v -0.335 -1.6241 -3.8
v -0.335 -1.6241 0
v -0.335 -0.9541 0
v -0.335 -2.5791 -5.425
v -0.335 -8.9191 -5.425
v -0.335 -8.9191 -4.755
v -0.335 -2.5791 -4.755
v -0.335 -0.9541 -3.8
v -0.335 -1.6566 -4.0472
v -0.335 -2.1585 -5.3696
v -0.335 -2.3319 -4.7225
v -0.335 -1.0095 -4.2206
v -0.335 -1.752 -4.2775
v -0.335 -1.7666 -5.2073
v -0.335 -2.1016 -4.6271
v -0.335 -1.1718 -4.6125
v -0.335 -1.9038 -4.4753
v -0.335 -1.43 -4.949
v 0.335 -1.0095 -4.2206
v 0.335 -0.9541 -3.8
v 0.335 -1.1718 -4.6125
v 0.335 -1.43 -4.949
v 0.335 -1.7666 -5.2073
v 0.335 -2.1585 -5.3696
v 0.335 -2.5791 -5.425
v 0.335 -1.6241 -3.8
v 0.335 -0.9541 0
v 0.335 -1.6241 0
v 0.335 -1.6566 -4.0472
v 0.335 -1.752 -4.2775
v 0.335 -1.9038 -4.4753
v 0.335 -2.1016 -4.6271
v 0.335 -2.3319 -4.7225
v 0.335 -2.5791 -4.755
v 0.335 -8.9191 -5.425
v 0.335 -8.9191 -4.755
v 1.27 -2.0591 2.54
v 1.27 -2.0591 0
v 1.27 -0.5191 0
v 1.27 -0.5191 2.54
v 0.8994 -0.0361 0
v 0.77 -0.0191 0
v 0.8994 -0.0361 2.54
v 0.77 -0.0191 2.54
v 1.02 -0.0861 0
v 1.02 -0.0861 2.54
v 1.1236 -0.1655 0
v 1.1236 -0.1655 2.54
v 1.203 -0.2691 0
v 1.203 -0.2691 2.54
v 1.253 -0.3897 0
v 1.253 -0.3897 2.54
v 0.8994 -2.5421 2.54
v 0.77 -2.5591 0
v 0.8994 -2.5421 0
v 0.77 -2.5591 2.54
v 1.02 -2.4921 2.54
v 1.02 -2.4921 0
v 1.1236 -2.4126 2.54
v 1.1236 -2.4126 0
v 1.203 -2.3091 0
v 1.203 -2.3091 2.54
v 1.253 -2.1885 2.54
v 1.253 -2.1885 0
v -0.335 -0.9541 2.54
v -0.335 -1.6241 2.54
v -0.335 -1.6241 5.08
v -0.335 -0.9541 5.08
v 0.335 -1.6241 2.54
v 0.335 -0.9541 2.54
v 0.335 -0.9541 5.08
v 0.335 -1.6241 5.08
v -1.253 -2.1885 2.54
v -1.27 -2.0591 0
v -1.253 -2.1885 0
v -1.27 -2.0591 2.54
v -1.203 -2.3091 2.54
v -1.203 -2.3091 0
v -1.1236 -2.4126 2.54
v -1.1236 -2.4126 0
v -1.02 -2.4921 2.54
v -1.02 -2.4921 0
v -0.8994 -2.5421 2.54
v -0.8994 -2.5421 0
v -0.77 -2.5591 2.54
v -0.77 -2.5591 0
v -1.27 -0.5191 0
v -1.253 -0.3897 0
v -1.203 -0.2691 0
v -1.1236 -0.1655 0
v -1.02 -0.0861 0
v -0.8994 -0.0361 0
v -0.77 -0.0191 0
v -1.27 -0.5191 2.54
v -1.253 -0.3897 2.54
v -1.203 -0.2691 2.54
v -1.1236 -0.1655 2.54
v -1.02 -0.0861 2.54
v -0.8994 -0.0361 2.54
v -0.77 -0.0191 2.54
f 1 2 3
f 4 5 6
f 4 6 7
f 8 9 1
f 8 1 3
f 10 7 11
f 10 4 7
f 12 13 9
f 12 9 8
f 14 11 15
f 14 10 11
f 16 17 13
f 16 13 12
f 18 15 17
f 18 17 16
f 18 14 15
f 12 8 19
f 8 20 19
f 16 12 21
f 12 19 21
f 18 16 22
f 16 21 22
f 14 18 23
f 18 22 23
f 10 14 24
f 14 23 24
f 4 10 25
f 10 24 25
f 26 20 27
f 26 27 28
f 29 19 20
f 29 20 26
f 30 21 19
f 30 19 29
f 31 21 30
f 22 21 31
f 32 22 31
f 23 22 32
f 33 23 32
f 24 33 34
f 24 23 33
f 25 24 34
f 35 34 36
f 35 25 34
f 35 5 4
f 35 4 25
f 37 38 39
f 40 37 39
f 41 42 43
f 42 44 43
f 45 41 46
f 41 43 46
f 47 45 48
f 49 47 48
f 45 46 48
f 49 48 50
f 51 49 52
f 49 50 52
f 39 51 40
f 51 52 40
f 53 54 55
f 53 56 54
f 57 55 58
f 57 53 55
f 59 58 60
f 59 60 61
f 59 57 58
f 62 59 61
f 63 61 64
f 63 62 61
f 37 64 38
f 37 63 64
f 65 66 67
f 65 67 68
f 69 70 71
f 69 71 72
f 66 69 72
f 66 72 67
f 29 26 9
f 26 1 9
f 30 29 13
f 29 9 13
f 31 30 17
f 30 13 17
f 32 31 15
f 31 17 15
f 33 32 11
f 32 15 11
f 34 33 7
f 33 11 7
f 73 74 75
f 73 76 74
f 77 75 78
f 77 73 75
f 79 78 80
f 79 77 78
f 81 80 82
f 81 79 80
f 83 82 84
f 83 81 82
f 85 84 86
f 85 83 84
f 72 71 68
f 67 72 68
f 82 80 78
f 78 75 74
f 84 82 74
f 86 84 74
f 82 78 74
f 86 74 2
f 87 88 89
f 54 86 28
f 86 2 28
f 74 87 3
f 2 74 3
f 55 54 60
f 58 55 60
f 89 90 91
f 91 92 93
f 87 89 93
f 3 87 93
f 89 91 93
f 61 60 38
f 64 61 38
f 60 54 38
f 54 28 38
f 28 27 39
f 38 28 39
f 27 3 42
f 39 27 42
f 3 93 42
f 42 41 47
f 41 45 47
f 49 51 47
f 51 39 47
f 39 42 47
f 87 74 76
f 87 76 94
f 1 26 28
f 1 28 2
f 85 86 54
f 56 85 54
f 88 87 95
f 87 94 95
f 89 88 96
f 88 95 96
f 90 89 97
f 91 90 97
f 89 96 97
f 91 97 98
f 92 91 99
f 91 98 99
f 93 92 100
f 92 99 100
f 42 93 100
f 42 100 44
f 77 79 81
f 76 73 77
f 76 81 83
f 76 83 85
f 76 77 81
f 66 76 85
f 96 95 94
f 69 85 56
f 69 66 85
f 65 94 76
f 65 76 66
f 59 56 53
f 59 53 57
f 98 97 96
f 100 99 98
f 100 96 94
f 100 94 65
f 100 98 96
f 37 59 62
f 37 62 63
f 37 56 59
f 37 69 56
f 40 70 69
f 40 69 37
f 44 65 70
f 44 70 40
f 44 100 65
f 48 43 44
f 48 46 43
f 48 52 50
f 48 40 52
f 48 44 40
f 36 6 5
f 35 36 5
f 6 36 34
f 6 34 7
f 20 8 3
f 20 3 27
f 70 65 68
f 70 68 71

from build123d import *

# Parameters (mm, degrees)
SKETCH_1_W      = 2.54
SKETCH_1_H      = 2.54
EXTRUDE_1_DEPTH = 2.54
SKETCH_2_W      = 0.67
SKETCH_2_H      = 0.67
FILLET_1_R      = 0.5


with BuildPart() as part:
    # 草图1 → 拉伸1 (new body)
    with BuildSketch(Plane.XY):
        with Locations((0, -1.289090726)):
            Rectangle(SKETCH_1_W, SKETCH_1_H)
    extrude(amount=EXTRUDE_1_DEPTH)

    # 扫描1: sweep along a path in 草图3
    with BuildLine(Plane(origin=(0, 0, 0), x_dir=(0, 0, -1), z_dir=(1, 0, 0))) as sweep_1_path:
        Line((-5.08, -1.299090726), (3.8, -1.299090726))
        ThreePointArc((3.8, -1.299090726), (4.70509668, -1.673994046), (5.08, -2.579090726))
        Line((5.08, -2.579090726), (5.08, -8.919090726))
    # 草图2 → 扫描1 (sweep)
    with BuildSketch(Plane(origin=(0, 0, 5.08), x_dir=(-1, 0, 0), z_dir=(0, 0, -1))):
        with Locations((0, -1.289090726)):
            Rectangle(SKETCH_2_W, SKETCH_2_H)
    sweep(path=sweep_1_path.line)

    # 圆角1
    fillet_1_edges = [part.edges().sort_by_distance(p)[0] for p in [
        (-1.27, -0.019090726, 1.27),
        (1.27, -0.019090726, 1.27),
        (1.27, -2.559090726, 1.27),
        (-1.27, -2.559090726, 1.27),
    ]]
    fillet(fillet_1_edges, radius=FILLET_1_R)


solid = part.part
